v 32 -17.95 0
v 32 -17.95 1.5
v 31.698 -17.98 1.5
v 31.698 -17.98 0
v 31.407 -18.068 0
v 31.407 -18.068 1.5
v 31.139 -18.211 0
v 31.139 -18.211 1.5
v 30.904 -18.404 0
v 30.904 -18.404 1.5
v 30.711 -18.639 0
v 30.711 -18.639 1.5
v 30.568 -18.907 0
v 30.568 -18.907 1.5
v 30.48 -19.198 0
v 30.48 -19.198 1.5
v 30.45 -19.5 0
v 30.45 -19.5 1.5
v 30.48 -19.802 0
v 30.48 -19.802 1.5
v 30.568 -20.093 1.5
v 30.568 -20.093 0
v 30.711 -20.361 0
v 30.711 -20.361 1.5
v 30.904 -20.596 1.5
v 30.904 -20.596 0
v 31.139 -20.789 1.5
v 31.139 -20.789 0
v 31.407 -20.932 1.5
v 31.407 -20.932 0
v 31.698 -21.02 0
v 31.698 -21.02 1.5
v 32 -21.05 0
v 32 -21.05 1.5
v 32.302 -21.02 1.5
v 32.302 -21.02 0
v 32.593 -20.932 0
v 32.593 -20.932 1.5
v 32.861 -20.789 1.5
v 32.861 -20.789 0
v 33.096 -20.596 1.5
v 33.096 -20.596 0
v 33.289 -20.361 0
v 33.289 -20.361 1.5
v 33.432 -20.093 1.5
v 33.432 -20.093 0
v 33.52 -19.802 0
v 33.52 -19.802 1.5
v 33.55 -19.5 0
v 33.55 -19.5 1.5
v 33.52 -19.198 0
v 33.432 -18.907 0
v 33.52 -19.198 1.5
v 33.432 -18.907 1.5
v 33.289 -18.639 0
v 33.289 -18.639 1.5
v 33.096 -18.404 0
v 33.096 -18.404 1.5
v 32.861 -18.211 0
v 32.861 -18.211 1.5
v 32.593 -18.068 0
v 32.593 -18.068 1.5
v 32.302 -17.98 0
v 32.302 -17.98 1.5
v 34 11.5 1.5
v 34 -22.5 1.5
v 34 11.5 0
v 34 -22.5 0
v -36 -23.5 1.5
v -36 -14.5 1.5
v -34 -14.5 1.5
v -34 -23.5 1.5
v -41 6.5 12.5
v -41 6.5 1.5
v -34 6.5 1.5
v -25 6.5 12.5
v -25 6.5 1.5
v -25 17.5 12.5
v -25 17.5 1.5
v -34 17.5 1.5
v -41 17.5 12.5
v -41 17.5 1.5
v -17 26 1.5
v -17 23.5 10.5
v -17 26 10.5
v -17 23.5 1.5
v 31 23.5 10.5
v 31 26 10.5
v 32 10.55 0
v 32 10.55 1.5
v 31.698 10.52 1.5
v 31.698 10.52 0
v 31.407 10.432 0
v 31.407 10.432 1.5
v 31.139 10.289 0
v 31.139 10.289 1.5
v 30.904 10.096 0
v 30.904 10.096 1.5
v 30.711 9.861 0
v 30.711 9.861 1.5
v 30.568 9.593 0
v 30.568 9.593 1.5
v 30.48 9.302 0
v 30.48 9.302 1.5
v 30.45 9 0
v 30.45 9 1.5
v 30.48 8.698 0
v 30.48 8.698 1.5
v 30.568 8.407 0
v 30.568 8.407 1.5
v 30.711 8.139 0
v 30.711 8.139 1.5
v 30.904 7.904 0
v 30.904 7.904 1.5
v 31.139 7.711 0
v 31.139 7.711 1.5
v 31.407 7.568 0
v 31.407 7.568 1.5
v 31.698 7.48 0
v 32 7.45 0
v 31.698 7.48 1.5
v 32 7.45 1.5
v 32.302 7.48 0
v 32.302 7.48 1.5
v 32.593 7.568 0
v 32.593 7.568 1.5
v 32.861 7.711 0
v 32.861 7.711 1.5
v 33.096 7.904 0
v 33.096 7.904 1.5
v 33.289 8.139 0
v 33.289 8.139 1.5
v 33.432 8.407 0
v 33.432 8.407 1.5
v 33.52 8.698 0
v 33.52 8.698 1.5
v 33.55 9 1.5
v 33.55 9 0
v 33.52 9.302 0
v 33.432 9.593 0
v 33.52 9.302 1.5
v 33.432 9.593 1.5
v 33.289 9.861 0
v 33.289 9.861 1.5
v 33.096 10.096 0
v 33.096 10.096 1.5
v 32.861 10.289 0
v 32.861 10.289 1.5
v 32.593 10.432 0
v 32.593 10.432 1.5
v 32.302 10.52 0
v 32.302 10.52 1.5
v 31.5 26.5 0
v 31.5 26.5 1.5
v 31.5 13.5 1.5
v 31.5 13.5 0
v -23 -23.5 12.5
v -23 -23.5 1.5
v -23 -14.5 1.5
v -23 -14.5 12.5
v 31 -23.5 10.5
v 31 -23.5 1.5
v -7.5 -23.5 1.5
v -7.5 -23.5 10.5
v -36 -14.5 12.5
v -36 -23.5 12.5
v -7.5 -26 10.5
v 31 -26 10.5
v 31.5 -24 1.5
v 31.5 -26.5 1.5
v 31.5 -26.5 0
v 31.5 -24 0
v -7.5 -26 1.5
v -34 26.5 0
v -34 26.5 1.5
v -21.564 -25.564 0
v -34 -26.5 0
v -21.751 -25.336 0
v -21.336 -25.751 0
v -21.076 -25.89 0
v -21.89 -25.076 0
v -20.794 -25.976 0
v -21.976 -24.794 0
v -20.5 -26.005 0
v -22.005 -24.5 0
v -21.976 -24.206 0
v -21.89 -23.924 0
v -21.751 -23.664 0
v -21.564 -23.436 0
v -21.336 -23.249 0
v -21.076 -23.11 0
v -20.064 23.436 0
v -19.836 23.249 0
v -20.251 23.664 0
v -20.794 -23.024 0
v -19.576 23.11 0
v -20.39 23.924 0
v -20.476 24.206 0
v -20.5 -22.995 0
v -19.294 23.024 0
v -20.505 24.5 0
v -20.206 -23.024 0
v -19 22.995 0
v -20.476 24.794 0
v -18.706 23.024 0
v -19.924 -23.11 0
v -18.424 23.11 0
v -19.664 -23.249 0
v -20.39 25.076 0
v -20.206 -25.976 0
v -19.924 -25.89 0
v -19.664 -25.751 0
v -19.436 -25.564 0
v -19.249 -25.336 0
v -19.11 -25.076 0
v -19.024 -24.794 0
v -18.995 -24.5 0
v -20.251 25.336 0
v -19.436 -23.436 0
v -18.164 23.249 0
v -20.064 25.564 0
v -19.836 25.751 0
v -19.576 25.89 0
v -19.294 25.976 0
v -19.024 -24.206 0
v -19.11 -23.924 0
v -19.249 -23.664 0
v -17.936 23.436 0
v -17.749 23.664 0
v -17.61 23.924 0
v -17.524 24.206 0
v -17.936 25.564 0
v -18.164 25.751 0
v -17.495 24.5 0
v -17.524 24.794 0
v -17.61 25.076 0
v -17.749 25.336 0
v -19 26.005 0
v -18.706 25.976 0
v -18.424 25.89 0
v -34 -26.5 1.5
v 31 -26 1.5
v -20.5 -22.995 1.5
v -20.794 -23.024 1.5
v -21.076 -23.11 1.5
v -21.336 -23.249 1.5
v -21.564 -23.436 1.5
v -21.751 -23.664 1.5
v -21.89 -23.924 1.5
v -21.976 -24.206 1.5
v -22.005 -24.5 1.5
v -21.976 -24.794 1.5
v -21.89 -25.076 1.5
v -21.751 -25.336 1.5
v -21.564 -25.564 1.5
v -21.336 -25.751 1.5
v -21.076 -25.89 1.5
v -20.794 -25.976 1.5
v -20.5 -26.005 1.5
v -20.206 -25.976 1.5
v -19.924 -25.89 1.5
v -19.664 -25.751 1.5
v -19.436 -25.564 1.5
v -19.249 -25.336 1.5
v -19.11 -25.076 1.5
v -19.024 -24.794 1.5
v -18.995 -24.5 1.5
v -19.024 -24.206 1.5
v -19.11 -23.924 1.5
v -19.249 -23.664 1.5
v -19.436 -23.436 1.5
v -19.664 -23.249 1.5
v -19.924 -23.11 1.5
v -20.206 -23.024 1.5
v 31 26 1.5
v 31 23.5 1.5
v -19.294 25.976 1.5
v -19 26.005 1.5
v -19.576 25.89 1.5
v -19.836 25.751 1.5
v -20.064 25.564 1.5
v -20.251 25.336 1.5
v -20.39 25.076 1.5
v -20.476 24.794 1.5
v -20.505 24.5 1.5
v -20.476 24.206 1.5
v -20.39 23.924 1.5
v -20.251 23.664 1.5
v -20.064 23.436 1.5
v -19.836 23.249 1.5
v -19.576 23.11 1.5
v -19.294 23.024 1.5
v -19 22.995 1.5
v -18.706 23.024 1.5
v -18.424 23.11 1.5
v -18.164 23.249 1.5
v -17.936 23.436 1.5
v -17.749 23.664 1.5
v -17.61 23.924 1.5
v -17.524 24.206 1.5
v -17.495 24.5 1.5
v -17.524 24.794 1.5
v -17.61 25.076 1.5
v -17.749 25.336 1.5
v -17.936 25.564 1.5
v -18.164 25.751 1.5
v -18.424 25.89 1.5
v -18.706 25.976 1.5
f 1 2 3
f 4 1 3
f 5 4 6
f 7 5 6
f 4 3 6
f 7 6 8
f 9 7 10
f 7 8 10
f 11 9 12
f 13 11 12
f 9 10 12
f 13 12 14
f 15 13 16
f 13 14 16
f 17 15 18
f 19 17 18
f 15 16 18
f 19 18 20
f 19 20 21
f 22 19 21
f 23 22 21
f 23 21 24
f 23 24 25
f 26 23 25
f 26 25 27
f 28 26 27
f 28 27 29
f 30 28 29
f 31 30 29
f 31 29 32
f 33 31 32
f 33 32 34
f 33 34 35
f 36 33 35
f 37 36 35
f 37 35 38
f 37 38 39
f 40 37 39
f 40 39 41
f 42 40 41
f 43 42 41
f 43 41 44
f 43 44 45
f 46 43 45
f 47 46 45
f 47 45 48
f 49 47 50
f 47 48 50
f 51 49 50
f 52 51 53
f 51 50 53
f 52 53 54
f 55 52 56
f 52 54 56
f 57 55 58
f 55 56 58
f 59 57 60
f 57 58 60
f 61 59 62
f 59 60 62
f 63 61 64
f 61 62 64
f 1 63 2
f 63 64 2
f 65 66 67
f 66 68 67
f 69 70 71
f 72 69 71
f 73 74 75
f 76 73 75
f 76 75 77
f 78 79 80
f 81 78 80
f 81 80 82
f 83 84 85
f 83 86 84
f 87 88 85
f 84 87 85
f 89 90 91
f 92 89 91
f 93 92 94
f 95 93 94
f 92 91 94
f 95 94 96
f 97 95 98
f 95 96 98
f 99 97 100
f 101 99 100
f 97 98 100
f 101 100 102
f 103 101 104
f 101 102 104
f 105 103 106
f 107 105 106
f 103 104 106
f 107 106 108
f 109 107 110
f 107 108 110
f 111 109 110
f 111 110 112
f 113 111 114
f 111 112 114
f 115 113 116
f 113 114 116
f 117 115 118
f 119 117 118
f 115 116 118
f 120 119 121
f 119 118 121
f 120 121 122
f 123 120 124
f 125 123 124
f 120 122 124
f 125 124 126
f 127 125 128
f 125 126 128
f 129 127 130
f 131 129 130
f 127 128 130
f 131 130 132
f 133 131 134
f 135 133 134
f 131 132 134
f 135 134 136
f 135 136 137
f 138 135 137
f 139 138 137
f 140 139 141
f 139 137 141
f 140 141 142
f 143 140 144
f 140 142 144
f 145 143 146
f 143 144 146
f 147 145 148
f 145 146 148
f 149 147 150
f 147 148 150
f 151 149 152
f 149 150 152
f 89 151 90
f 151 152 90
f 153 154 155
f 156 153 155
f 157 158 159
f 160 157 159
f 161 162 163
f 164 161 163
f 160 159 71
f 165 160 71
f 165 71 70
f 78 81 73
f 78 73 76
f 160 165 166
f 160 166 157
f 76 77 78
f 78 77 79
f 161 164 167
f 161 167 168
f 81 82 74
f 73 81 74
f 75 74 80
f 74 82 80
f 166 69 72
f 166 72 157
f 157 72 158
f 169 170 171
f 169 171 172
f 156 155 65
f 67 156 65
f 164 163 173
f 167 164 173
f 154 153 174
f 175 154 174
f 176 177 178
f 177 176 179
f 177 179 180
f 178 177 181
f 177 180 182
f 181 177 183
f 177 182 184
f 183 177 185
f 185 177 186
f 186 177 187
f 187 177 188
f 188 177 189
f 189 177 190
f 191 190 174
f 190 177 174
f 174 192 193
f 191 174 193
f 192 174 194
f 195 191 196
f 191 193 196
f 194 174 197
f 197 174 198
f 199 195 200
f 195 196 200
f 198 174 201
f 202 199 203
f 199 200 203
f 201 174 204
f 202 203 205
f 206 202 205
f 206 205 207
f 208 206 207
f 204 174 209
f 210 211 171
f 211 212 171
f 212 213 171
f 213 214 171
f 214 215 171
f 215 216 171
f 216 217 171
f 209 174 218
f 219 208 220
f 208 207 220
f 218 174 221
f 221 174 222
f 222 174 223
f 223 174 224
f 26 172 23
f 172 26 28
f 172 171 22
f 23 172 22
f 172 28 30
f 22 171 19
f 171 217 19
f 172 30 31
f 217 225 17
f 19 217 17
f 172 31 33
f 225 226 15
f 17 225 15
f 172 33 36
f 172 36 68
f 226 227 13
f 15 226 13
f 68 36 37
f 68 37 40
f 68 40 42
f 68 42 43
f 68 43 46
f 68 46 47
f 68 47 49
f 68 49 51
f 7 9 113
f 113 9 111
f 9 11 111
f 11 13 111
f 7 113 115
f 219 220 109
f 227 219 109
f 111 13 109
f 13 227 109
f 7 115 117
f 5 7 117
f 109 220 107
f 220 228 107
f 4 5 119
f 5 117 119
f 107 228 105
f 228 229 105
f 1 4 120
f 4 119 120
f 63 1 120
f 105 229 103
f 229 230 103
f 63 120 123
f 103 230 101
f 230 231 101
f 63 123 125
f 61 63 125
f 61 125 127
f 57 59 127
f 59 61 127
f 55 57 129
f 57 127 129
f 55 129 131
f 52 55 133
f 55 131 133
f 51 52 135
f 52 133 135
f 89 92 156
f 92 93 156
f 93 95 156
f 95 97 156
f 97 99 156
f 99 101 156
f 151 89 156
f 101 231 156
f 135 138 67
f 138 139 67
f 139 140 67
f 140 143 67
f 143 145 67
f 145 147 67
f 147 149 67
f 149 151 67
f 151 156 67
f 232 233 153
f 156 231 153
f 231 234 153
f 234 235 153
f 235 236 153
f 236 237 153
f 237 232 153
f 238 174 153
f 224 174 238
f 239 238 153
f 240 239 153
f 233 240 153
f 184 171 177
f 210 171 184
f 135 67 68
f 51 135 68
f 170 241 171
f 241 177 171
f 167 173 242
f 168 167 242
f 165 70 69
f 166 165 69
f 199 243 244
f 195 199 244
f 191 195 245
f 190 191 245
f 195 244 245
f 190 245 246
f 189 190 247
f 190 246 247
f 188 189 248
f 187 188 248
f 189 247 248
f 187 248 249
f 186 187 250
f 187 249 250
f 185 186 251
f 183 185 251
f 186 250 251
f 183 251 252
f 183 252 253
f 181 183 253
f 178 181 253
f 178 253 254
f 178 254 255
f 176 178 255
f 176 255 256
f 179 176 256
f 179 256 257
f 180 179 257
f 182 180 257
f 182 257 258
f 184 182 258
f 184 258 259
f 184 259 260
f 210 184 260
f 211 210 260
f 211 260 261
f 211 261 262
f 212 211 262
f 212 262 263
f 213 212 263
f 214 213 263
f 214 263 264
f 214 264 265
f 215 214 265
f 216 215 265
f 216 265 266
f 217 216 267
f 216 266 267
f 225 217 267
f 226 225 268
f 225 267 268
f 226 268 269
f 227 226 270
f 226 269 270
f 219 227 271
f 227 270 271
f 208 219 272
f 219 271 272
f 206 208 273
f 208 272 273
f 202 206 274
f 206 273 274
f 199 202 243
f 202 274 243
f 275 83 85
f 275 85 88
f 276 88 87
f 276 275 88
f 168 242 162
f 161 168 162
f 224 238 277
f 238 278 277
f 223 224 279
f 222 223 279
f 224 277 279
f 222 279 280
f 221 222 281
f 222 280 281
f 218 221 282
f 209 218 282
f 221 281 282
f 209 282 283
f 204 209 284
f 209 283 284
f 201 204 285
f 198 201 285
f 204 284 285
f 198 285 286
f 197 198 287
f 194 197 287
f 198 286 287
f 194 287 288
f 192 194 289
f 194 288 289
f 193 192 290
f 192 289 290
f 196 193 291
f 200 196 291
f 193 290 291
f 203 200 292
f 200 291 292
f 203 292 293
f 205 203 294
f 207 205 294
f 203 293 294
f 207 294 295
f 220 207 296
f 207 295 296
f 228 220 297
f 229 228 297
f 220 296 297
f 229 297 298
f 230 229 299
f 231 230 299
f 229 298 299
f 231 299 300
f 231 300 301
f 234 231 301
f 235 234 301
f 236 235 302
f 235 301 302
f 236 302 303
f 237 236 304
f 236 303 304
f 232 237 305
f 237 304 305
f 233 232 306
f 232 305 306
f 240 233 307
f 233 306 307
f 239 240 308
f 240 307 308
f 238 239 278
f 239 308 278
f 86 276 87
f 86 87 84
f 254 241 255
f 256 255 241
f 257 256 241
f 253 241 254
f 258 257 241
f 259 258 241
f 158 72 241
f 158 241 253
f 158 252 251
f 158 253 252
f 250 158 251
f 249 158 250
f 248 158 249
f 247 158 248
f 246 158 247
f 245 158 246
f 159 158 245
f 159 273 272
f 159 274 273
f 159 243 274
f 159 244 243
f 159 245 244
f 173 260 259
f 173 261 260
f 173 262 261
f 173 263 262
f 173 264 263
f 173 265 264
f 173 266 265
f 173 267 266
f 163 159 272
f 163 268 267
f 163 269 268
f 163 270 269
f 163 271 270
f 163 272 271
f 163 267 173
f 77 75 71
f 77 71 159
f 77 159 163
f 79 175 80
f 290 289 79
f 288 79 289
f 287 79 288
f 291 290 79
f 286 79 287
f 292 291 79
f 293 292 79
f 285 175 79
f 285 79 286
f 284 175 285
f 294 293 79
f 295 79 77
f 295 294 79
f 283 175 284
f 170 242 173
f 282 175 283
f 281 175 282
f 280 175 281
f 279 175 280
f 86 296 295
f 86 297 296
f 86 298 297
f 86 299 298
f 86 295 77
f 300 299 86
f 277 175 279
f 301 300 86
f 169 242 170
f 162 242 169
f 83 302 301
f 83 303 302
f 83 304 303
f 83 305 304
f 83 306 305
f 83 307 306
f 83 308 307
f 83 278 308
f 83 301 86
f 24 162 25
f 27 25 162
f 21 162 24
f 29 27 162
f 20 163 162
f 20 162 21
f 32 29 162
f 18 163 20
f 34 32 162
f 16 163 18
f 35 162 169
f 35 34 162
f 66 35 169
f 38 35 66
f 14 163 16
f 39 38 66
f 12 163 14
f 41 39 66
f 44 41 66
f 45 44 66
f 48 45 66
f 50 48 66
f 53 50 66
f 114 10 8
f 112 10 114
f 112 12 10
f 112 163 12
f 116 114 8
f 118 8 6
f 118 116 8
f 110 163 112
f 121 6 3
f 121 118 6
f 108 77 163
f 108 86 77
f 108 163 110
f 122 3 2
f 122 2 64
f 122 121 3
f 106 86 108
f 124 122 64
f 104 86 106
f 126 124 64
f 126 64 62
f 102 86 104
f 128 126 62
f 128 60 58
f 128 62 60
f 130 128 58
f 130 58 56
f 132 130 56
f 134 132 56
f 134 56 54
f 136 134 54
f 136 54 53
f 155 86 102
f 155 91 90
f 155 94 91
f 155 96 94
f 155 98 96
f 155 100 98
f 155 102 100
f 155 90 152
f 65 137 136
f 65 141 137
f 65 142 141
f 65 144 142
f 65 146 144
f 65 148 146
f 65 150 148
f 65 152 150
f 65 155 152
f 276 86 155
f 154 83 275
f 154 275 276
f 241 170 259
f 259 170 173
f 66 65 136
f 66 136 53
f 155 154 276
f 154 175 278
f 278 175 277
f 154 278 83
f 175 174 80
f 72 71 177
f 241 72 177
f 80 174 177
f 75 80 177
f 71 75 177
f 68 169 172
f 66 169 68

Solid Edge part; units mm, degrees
sketch "Sketch1" plane through (0, 0, 0) normal (0, 0, 1) x (1, 0, 0)
  line L0 (-34, -26.5) -> (34, -26.5)
  line L1 (34, -26.5) -> (34, 26.5)
  line L2 (34, 26.5) -> (-34, 26.5)
  line L3 (-34, 26.5) -> (-34, -26.5)
  dimension "D1" = 53
  dimension "D2" = 68
extrude "Ajout_matière_1" add sketch "Sketch1" along normal blind 1.5
sketch "Sketch2" plane through (0, 0, 1.5) normal (0, 0, 1) x (0, 1, 0)
  line L0 (26.5, -34) -> (26.5, -31.5)
  line L1 (26.5, -31.5) -> (13.5, -31.5)
  line L2 (13.5, -31.5) -> (11.5, -34)
  line L3 (11.5, -34) -> (26.5, -34)
  line L4 (-26.5, -34) -> (-26.5, -31.5)
  line L5 (-26.5, -31.5) -> (-24, -31.5)
  line L6 (-24, -31.5) -> (-22.5, -34)
  line L7 (-22.5, -34) -> (-26.5, -34)
  dimension "D1" = 2.5
  dimension "D2" = 13
  dimension "D3" = 15
  dimension "D4" = 2.5
  dimension "D5" = 2.5
  dimension "D6" = 4
extrude "Cutout1" cut sketch "Sketch2" against normal through all
sketch "Sketch3" plane through (0, 0, 1.5) normal (0, 0, 1) x (0, 1, 0)
  circle A0 centre (-19.5, -32) radius 1.55
  circle A1 centre (-24.5, 20.5) radius 1.505
  circle A2 centre (9, -32) radius 1.55
  circle A3 centre (24.5, 19) radius 1.505
  dimension "D1" = 3.1
  dimension "D2" = 66
  dimension "D3" = 7
  dimension "D4" = 3.01
  dimension "D5" = 13.5
  dimension "D6" = 2
  dimension "D7" = 3.1
  dimension "D8" = 17.5
  dimension "D9" = 2
  dimension "D10" = 3.01
  dimension "D11" = 15
  dimension "D12" = 2
extrude "Cutout2" cut sketch "Sketch3" against normal through all
sketch "Sketch4" plane through (0, 0, 1.5) normal (0, 0, 1) x (0, 1, 0)
  line L0 (-23.5, 23) -> (-14.5, 23)
  line L1 (-14.5, 23) -> (-14.5, 36)
  line L2 (-14.5, 36) -> (-23.5, 36)
  line L3 (-23.5, 36) -> (-23.5, 23)
  dimension "D1" = 13
  dimension "D2" = 9
  dimension "D3" = 11
  dimension "D4" = 3
extrude "Ajout_matière_2" add sketch "Sketch4" along normal blind 11
sketch "Sketch5" plane through (0, 0, 1.5) normal (0, 0, 1) x (0, 1, 0)
  line L0 (6.5, 25) -> (17.5, 25)
  line L1 (17.5, 25) -> (17.5, 41)
  line L2 (17.5, 41) -> (6.5, 41)
  line L3 (6.5, 41) -> (6.5, 25)
  dimension "D1" = 11
  dimension "D2" = 16
  dimension "D3" = 9
  dimension "D4" = 7
extrude "Ajout_matière_3" add sketch "Sketch5" along normal blind 11
sketch "Sketch6" plane through (0, 0, 1.5) normal (0, 0, 1) x (0, 1, 0)
  line L0 (-26, -31) -> (-23.5, -31)
  line L1 (-23.5, -31) -> (-23.5, 7.5)
  line L2 (-23.5, 7.5) -> (-26, 7.5)
  line L3 (-26, 7.5) -> (-26, -31)
  line L4 (23.5, 17) -> (26, 17)
  line L5 (26, 17) -> (26, -31)
  line L6 (26, -31) -> (23.5, -31)
  line L7 (23.5, -31) -> (23.5, 17)
  dimension "D1" = 26
  dimension "D2" = 26
  dimension "D3" = 23.5
  dimension "D4" = 23.5
extrude "Ajout_matière_4" add sketch "Sketch6" along normal blind 9
properties material "Acier S235"
